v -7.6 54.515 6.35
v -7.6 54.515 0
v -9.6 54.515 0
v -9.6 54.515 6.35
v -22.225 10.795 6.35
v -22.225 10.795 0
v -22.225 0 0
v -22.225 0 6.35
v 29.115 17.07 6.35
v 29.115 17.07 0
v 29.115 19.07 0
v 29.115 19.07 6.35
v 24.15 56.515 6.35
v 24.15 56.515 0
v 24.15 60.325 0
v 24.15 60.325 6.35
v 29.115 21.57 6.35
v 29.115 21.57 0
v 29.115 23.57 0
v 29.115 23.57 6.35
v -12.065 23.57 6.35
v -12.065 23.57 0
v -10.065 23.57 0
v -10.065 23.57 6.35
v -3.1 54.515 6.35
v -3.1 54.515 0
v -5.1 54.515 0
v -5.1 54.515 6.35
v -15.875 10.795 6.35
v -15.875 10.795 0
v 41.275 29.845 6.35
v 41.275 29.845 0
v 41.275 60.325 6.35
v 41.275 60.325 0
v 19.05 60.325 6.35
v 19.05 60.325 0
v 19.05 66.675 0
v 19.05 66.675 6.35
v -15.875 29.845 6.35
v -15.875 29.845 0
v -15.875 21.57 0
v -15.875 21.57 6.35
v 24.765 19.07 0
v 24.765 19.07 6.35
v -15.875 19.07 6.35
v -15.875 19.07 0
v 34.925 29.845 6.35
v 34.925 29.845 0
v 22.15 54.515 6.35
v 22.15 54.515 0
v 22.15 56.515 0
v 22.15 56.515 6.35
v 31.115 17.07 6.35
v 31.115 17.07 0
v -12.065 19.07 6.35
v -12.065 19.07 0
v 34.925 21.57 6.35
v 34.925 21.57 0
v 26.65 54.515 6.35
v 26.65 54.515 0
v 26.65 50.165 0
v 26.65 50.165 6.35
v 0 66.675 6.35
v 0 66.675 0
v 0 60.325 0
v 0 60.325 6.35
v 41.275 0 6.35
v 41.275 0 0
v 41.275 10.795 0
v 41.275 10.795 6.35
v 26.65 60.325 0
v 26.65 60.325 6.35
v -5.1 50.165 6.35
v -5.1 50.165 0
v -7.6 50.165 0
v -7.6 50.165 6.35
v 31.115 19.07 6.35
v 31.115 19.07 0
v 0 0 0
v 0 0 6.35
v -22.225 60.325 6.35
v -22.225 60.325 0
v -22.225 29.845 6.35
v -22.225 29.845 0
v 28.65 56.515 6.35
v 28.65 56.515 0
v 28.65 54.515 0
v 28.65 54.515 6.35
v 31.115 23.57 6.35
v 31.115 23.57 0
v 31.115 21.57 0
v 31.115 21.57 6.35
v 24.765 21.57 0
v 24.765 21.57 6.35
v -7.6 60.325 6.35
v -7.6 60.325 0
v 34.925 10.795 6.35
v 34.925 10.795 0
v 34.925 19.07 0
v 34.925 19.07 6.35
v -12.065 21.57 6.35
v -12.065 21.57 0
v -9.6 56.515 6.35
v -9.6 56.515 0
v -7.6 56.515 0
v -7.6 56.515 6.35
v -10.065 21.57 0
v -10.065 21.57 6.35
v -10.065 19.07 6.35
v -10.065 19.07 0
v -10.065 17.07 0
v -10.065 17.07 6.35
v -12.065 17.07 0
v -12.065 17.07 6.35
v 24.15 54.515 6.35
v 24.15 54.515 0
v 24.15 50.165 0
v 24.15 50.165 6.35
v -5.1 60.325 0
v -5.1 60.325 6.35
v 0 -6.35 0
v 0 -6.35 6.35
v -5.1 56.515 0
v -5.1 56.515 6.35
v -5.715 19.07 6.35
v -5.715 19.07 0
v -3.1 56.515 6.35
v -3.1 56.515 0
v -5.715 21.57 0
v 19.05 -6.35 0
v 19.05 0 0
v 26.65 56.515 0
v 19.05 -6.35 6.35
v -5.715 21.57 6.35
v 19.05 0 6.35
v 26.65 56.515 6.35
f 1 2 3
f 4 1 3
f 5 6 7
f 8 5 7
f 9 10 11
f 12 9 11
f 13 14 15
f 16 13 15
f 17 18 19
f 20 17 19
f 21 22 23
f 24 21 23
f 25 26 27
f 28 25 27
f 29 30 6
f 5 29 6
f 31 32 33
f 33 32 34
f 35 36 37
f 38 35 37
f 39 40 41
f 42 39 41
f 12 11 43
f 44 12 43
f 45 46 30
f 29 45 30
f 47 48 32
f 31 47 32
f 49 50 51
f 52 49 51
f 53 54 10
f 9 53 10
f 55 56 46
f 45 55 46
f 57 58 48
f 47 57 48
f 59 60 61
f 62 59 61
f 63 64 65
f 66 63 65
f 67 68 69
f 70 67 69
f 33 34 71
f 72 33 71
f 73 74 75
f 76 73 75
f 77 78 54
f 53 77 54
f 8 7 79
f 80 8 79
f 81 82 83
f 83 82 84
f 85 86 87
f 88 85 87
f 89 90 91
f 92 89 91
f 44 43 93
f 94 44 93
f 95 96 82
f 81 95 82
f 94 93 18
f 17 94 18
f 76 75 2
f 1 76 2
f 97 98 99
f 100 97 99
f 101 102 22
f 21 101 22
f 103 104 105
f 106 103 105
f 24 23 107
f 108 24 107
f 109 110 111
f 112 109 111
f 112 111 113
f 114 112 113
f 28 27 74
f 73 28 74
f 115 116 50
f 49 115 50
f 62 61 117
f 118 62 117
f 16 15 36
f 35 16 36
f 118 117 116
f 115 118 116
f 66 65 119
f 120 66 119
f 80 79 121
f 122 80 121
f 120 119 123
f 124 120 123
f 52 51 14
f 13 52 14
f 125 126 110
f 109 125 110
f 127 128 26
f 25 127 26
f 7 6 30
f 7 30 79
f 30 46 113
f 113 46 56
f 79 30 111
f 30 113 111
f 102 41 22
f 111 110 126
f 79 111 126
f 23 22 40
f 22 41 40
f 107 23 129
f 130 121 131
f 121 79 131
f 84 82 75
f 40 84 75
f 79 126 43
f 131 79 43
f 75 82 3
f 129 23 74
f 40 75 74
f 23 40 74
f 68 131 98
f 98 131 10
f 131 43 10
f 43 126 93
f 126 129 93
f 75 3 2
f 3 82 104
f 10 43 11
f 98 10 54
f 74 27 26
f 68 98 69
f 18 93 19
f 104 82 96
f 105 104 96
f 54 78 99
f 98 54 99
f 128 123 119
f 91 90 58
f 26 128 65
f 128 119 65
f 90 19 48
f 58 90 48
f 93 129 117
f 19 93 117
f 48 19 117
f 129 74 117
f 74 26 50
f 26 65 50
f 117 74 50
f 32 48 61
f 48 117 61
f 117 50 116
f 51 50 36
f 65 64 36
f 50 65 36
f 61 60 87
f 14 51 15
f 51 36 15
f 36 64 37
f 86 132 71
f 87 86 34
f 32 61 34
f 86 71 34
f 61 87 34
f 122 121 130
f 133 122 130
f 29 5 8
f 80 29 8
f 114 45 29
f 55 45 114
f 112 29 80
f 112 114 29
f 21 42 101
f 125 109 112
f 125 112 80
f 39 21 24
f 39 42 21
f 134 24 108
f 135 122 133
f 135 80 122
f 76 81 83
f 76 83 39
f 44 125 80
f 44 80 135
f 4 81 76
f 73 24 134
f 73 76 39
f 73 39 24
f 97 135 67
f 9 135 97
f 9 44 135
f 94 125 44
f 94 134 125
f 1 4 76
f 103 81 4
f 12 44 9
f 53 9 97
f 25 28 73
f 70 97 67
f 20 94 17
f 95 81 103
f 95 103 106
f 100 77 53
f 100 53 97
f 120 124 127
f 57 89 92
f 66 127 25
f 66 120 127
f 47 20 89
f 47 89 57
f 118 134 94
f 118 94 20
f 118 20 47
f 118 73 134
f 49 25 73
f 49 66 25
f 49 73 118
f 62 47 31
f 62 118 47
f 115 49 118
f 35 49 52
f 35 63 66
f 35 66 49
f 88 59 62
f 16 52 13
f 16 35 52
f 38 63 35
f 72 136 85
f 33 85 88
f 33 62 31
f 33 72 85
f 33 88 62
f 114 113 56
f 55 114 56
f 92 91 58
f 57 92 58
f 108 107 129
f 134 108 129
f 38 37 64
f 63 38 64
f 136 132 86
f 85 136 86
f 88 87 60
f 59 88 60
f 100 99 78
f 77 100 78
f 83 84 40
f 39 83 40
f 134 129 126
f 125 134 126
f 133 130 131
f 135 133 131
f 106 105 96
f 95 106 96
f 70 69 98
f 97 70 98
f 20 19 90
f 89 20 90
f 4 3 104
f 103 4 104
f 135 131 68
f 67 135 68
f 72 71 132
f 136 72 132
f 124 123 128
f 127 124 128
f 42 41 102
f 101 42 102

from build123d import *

# Parameters (mm, degrees)
BOSS_EXTRUDE1_DEPTH = 6.35


with BuildPart() as part:
    # Sketch1 → Boss-Extrude1 (new body)
    with BuildSketch(Plane.XY):
        Polygon((0, -6.35), (19.05, -6.35), (19.05, 0), (34.925, 0), (41.275, 0), (41.275, 10.795), (34.925, 10.795), (34.925, 19.07), (31.115, 19.07), (31.115, 17.07), (29.115, 17.07), (29.115, 19.07), (24.765, 19.07), (24.765, 21.57), (29.115, 21.57), (29.115, 23.57), (31.115, 23.57), (31.115, 21.57), (34.925, 21.57), (34.925, 29.845), (41.275, 29.845), (41.275, 60.325), (34.925, 60.325), (26.65, 60.325), (26.65, 56.515), (28.65, 56.515), (28.65, 54.515), (26.65, 54.515), (26.65, 50.165), (24.15, 50.165), (24.15, 54.515), (22.15, 54.515), (22.15, 56.515), (24.15, 56.515), (24.15, 60.325), (19.05, 60.325), (19.05, 66.675), (0, 66.675), (0, 60.325), (-5.1, 60.325), (-5.1, 56.515), (-3.1, 56.515), (-3.1, 54.515), (-5.1, 54.515), (-5.1, 50.165), (-7.6, 50.165), (-7.6, 54.515), (-9.6, 54.515), (-9.6, 56.515), (-7.6, 56.515), (-7.6, 60.325), (-15.875, 60.325), (-22.225, 60.325), (-22.225, 29.845), (-15.875, 29.845), (-15.875, 21.57), (-12.065, 21.57), (-12.065, 23.57), (-10.065, 23.57), (-10.065, 21.57), (-5.715, 21.57), (-5.715, 19.07), (-10.065, 19.07), (-10.065, 17.07), (-12.065, 17.07), (-12.065, 19.07), (-15.875, 19.07), (-15.875, 10.795), (-22.225, 10.795), (-22.225, 0), (-15.875, 0), (0, 0), align=None)
    extrude(amount=BOSS_EXTRUDE1_DEPTH)


solid = part.part
